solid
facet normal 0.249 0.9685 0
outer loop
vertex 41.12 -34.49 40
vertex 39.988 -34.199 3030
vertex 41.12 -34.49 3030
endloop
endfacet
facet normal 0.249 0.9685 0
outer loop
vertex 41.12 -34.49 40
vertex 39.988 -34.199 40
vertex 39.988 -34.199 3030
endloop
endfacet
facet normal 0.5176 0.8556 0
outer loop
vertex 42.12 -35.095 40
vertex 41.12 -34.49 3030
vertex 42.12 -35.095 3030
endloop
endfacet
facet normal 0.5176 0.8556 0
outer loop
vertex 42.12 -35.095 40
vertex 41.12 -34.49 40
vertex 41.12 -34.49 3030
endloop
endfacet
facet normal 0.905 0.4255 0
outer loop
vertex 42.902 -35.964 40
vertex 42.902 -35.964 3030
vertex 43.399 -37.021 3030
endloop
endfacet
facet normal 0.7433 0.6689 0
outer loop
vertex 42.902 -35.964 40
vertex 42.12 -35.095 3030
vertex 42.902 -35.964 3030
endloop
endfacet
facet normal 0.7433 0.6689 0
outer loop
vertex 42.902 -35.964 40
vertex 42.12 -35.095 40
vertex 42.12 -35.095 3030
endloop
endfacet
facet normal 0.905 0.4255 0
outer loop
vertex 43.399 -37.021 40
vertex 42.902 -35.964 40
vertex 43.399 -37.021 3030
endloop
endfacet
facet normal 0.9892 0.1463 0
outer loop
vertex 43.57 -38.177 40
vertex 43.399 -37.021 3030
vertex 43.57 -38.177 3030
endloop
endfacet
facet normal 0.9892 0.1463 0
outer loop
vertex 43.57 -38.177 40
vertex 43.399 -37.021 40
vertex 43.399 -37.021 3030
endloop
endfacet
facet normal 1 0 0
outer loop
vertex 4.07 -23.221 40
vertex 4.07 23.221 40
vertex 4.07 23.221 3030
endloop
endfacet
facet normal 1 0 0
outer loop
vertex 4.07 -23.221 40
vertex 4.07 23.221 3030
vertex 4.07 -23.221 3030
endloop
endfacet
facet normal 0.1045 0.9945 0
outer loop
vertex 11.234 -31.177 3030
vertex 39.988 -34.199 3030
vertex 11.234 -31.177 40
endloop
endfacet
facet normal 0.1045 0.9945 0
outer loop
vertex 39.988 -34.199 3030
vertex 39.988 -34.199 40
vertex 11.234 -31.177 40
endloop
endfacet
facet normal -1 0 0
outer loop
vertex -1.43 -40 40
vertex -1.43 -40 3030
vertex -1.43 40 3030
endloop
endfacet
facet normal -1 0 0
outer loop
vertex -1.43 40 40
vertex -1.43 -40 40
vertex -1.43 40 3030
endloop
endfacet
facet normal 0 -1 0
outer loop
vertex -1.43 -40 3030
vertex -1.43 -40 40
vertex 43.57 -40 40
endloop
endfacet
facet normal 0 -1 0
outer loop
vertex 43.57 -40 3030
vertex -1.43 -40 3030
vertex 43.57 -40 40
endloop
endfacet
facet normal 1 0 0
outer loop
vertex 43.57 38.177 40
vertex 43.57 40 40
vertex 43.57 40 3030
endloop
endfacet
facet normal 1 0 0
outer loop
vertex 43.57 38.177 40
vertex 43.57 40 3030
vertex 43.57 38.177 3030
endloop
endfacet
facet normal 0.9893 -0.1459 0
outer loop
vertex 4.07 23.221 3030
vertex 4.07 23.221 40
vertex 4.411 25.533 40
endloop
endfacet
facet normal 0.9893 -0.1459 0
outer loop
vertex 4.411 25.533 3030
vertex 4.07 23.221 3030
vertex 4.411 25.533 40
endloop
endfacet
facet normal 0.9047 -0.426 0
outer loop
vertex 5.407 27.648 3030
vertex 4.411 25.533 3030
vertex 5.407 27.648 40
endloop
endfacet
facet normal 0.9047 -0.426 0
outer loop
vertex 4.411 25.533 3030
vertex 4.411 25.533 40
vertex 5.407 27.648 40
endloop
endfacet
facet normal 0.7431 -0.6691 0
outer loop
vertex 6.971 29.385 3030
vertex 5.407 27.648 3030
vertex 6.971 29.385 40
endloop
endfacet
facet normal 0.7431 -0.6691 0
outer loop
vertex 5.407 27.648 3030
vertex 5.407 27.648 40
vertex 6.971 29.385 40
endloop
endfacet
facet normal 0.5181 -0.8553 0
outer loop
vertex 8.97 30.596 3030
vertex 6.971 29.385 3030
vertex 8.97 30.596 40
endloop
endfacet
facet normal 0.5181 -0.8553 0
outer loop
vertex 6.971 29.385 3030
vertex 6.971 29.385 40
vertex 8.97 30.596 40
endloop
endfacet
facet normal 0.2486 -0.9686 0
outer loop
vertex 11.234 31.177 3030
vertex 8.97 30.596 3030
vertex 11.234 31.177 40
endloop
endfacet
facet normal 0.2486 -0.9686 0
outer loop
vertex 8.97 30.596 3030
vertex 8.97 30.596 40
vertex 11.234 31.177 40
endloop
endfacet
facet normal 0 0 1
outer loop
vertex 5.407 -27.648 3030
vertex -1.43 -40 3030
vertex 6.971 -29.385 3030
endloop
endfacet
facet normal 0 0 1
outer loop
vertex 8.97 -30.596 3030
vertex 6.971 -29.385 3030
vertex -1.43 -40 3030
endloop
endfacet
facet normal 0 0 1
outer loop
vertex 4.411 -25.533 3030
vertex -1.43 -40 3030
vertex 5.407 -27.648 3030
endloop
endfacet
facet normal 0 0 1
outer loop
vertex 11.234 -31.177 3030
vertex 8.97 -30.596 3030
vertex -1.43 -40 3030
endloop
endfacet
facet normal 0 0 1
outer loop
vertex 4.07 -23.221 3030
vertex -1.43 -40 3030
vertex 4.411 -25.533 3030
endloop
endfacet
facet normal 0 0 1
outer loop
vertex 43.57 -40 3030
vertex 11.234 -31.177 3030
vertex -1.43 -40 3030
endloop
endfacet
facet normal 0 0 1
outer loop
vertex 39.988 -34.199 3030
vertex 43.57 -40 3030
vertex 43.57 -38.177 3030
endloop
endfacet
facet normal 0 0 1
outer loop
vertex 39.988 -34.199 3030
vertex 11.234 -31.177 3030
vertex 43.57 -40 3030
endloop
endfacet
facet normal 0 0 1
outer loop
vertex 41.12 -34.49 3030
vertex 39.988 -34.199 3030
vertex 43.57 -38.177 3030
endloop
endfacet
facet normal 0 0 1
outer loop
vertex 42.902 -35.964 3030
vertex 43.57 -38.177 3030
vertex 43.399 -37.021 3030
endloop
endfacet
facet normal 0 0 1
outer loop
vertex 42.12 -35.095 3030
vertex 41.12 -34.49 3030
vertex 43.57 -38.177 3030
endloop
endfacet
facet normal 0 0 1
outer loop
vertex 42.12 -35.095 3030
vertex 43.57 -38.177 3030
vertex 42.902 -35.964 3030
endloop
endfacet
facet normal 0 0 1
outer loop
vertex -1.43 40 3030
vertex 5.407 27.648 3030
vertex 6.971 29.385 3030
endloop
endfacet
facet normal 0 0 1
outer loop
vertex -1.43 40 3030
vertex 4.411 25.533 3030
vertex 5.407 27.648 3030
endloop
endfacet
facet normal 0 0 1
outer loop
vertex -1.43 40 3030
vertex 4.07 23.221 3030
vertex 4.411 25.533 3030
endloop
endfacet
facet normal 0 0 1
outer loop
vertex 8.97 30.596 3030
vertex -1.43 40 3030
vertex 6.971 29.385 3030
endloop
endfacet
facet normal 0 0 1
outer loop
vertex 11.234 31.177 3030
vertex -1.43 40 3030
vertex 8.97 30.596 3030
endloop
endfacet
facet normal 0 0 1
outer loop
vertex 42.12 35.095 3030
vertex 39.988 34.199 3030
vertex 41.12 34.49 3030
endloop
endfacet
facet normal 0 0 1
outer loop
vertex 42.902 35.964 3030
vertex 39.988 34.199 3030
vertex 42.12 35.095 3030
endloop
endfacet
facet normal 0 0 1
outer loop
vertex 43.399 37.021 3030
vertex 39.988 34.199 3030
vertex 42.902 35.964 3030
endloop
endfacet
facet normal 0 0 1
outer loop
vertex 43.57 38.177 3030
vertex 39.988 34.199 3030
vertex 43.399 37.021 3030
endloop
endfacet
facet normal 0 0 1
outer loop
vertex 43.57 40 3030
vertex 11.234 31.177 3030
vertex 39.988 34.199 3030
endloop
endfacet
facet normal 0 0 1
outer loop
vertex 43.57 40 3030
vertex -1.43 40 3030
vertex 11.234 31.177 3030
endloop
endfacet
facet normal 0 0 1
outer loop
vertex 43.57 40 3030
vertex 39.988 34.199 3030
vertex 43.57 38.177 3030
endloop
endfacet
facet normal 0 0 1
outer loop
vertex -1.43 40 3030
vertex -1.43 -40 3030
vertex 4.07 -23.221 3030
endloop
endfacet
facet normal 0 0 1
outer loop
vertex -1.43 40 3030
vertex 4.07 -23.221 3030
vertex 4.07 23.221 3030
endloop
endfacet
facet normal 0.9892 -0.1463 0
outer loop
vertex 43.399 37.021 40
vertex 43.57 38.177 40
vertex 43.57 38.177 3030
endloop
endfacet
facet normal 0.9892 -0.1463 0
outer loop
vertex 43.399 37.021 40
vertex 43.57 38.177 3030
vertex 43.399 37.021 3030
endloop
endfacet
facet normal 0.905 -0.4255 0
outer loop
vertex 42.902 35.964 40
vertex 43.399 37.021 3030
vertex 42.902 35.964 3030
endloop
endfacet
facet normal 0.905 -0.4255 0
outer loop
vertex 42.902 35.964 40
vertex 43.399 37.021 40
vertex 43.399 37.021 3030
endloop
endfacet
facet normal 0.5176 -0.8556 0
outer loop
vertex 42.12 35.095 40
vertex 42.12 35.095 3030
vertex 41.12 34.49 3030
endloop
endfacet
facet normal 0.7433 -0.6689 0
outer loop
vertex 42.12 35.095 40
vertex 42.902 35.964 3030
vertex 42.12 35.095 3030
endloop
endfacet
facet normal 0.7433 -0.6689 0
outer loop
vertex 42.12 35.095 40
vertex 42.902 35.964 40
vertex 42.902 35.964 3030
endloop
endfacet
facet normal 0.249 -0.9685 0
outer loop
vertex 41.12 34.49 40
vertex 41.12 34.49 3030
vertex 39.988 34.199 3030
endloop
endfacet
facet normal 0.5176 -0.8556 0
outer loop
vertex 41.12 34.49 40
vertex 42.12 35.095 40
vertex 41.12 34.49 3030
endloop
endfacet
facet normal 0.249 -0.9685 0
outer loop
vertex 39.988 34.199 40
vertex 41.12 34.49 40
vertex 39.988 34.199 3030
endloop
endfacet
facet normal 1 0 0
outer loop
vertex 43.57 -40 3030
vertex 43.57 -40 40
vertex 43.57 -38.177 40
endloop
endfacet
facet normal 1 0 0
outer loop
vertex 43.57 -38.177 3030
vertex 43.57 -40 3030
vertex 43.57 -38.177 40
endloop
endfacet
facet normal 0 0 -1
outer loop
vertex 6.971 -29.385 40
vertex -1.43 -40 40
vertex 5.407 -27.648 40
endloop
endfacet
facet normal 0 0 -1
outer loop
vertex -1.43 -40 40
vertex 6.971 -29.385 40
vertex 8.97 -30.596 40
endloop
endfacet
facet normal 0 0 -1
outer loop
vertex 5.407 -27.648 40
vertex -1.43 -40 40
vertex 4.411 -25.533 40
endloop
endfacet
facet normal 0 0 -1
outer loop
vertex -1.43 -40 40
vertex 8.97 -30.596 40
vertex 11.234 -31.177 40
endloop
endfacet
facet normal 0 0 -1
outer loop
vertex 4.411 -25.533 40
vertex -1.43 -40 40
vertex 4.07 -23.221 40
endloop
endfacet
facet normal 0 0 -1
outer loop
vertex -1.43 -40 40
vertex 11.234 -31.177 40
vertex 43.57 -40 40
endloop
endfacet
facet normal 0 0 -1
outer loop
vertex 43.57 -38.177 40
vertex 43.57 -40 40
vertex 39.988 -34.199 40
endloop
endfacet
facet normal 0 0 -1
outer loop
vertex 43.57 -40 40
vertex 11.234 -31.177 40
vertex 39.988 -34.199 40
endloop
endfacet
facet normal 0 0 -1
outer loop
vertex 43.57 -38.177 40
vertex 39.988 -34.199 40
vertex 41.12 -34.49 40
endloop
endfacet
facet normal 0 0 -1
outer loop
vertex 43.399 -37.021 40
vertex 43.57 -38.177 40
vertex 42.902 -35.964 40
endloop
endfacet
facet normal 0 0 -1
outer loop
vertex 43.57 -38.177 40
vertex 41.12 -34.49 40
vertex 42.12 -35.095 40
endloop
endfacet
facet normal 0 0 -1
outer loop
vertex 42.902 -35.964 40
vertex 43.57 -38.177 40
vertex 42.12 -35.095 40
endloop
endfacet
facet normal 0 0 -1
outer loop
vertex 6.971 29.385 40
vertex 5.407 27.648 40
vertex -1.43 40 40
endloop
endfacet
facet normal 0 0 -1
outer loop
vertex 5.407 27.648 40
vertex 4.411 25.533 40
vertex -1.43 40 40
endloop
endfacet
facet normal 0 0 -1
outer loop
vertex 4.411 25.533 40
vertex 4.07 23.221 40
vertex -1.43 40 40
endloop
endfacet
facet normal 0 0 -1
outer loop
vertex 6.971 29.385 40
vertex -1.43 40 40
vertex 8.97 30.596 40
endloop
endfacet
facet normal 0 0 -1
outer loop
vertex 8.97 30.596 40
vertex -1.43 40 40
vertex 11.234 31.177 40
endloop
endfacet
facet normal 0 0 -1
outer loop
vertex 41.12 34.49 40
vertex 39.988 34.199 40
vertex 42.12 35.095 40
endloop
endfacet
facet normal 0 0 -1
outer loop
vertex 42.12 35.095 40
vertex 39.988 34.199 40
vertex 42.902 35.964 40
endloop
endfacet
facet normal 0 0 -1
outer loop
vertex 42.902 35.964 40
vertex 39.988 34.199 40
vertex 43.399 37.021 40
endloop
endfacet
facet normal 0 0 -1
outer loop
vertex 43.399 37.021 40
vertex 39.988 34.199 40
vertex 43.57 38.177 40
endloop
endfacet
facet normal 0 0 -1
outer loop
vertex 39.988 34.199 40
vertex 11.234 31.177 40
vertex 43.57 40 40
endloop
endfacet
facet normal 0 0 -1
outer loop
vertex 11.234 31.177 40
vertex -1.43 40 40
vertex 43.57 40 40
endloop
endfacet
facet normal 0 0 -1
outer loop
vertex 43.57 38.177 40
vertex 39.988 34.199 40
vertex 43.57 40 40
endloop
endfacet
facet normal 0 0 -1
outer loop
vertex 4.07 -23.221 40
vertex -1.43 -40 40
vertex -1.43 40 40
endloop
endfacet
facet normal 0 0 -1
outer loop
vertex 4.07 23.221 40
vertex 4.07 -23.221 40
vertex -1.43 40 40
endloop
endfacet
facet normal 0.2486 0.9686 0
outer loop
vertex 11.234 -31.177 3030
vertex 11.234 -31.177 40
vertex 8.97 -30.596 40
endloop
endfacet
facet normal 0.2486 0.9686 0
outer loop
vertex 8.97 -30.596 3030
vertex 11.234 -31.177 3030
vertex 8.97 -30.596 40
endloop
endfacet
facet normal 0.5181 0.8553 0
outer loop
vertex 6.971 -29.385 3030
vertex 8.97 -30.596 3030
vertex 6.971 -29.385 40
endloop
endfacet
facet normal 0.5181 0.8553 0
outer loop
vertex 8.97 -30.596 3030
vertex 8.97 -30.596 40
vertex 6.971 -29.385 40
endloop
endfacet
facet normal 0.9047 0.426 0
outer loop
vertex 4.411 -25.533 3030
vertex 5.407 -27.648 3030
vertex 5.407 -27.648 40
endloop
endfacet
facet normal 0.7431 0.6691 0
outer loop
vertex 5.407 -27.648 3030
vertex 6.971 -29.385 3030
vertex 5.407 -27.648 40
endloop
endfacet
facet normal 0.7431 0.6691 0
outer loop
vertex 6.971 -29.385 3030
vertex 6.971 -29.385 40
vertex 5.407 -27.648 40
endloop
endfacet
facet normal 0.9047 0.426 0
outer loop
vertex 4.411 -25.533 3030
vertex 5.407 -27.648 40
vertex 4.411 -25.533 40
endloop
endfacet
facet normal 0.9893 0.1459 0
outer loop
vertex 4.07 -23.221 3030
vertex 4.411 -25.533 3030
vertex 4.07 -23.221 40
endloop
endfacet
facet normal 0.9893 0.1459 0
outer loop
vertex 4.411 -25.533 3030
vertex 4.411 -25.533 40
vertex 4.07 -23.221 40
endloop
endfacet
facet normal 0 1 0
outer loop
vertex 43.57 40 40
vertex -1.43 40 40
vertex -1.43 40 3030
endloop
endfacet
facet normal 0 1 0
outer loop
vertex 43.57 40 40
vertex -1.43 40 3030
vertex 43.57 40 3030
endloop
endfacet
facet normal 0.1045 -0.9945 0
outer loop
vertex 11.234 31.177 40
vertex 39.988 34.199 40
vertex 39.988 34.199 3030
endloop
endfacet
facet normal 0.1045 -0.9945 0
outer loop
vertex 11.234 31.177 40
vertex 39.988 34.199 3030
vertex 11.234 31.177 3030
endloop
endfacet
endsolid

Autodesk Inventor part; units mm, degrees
ref_plane "Начальная плоскость" through (0, 0, 40) normal (0, 0, 1) x (1, 0, 0)
ref_plane "Конечная плоскость" through (0, 0, 3030) normal (0, 0, 1) x (1, 0, 0)
sketch "Эскиз" plane through (0, 0, 0) normal (0, 0, 1) x (1, 0, 0)
  line L0 (-1.43, 0) -> (-1.43, 40)
  line L1 (-1.43, 40) -> (43.57, 40)
  line L2 (43.57, 40) -> (43.57, 38.1774)
  line L3 (39.9881, 34.1993) -> (11.2338, 31.1771)
  line L4 (4.07, 23.221) -> (4.07, 0)
  line L5 (4.07, 0) -> (-1.43, 0) construction
  line L6 (23.82, 40) -> (23.82, 32.5) construction
  line L7 (43.57, 34.5758) -> (43.57, 32.5) construction
  line L8 (43.57, 32.5) -> (23.82, 32.5) construction
  line L9 (0, 15) -> (0, -27) construction
  line L10 (-5.539, 0) -> (16.0067, 0) construction
  line L11 (-1.43, 0) -> (-1.43, -40)
  line L12 (-1.43, -40) -> (43.57, -40)
  line L13 (43.57, -40) -> (43.57, -38.1774)
  line L14 (39.9881, -34.1993) -> (11.2338, -31.1771)
  line L15 (4.07, -23.221) -> (4.07, 0)
  arc A0 (11.2338, 31.1771) -> (4.07, 23.221) centre (12.07, 23.221) ccw
  arc A1 (4.07, -23.221) -> (11.2338, -31.1771) centre (12.07, -23.221) ccw
  arc A2 (39.9881, 34.1993) -> (43.57, 38.1774) centre (39.57, 38.1774) ccw
  arc A3 (43.57, -38.1774) -> (39.9881, -34.1993) centre (39.57, -38.1774) ccw
  line L16 (0, 56) -> (0, -56) construction
  line L17 (-15.5135, 0) -> (54.308, 0) construction
  point P0 (4.07, 30.4242)
  point P1 (43.57, -34.5758)
  point P2 (4.07, -30.4242)
  point P3 (23.82, -40)
  point P4 (23.82, -32.5)
  dimension "d0" = 5.5
  dimension "d1" = 40
  dimension "d2" = 45
  dimension "d3" = 7.5
  dimension "d4" = 19.75
  dimension "d5" = 2.0758
  dimension "d23" = 8
  dimension "d24" = 4
  dimension "d25" = 1.43
extrude "Тело" add sketch "Эскиз" along normal up to surface (2990 mm away) from surface at 40
sketch "Sketch3" plane through (0, 0, 0) normal (0, 0, 1) x (1, 0, 0)
  line L0 (0, 0) -> (10, 0)
ref_plane "Work Plane3" through (0, 0, 0) normal (0, -1, 0) x (1, 0, 0)
sketch "Sketch4" plane through (0, 0, 0) normal (0, -1, 0) x (1, 0, 0)
  line L0 (-2, 40) -> (12, 40)
  line L1 (-2, 3030) -> (12, 3030)
  dimension "d29" = 2990
ref_plane "РабПлоскость4" through (-1.43, 1220, 40) normal (0, 0, -1) x (-1, 0, 0)
split "Разделение1" plane through (-1.43, 1220, 40) removes the side toward (0, 0, -1)
ref_plane "РабПлоскость5" through (-1.43, -500, 3030) normal (0, 0, 1) x (1, 0, 0)
split "Разделение2" plane through (-1.43, -500, 3030) removes the side toward (0, 0, 1)
equation "\"d0\" = G_T"
equation "\"d1\" = 0.5 * G_H"
equation "\"d2\" = G_W"
equation "\"d3\" = G_T1"
equation "\"d4\" = G_C"
equation "\"d23\" = G_IR"
equation "\"d24\" = G_ER"
equation "\"d25\" = ex"
equation "\"d6\" = G_L"
equation "\"G_W\" = 45"
equation "\"G_T\" = 5.5"
equation "\"G_T1\" = 7.5"
equation "\"G_NG\" = 0.105104"
equation "\"G_ER\" = 4"
equation "\"G_IR\" = 8"
equation "\"G_C\" = 19.75"
equation "\"G_L\" = d29"
equation "\"ex\" = 1.43"
equation "\"G_H\" = 80"
properties part number "ISO 657/11 - CH 80 x 8 - 2990" material "Сталь, мягкая"
